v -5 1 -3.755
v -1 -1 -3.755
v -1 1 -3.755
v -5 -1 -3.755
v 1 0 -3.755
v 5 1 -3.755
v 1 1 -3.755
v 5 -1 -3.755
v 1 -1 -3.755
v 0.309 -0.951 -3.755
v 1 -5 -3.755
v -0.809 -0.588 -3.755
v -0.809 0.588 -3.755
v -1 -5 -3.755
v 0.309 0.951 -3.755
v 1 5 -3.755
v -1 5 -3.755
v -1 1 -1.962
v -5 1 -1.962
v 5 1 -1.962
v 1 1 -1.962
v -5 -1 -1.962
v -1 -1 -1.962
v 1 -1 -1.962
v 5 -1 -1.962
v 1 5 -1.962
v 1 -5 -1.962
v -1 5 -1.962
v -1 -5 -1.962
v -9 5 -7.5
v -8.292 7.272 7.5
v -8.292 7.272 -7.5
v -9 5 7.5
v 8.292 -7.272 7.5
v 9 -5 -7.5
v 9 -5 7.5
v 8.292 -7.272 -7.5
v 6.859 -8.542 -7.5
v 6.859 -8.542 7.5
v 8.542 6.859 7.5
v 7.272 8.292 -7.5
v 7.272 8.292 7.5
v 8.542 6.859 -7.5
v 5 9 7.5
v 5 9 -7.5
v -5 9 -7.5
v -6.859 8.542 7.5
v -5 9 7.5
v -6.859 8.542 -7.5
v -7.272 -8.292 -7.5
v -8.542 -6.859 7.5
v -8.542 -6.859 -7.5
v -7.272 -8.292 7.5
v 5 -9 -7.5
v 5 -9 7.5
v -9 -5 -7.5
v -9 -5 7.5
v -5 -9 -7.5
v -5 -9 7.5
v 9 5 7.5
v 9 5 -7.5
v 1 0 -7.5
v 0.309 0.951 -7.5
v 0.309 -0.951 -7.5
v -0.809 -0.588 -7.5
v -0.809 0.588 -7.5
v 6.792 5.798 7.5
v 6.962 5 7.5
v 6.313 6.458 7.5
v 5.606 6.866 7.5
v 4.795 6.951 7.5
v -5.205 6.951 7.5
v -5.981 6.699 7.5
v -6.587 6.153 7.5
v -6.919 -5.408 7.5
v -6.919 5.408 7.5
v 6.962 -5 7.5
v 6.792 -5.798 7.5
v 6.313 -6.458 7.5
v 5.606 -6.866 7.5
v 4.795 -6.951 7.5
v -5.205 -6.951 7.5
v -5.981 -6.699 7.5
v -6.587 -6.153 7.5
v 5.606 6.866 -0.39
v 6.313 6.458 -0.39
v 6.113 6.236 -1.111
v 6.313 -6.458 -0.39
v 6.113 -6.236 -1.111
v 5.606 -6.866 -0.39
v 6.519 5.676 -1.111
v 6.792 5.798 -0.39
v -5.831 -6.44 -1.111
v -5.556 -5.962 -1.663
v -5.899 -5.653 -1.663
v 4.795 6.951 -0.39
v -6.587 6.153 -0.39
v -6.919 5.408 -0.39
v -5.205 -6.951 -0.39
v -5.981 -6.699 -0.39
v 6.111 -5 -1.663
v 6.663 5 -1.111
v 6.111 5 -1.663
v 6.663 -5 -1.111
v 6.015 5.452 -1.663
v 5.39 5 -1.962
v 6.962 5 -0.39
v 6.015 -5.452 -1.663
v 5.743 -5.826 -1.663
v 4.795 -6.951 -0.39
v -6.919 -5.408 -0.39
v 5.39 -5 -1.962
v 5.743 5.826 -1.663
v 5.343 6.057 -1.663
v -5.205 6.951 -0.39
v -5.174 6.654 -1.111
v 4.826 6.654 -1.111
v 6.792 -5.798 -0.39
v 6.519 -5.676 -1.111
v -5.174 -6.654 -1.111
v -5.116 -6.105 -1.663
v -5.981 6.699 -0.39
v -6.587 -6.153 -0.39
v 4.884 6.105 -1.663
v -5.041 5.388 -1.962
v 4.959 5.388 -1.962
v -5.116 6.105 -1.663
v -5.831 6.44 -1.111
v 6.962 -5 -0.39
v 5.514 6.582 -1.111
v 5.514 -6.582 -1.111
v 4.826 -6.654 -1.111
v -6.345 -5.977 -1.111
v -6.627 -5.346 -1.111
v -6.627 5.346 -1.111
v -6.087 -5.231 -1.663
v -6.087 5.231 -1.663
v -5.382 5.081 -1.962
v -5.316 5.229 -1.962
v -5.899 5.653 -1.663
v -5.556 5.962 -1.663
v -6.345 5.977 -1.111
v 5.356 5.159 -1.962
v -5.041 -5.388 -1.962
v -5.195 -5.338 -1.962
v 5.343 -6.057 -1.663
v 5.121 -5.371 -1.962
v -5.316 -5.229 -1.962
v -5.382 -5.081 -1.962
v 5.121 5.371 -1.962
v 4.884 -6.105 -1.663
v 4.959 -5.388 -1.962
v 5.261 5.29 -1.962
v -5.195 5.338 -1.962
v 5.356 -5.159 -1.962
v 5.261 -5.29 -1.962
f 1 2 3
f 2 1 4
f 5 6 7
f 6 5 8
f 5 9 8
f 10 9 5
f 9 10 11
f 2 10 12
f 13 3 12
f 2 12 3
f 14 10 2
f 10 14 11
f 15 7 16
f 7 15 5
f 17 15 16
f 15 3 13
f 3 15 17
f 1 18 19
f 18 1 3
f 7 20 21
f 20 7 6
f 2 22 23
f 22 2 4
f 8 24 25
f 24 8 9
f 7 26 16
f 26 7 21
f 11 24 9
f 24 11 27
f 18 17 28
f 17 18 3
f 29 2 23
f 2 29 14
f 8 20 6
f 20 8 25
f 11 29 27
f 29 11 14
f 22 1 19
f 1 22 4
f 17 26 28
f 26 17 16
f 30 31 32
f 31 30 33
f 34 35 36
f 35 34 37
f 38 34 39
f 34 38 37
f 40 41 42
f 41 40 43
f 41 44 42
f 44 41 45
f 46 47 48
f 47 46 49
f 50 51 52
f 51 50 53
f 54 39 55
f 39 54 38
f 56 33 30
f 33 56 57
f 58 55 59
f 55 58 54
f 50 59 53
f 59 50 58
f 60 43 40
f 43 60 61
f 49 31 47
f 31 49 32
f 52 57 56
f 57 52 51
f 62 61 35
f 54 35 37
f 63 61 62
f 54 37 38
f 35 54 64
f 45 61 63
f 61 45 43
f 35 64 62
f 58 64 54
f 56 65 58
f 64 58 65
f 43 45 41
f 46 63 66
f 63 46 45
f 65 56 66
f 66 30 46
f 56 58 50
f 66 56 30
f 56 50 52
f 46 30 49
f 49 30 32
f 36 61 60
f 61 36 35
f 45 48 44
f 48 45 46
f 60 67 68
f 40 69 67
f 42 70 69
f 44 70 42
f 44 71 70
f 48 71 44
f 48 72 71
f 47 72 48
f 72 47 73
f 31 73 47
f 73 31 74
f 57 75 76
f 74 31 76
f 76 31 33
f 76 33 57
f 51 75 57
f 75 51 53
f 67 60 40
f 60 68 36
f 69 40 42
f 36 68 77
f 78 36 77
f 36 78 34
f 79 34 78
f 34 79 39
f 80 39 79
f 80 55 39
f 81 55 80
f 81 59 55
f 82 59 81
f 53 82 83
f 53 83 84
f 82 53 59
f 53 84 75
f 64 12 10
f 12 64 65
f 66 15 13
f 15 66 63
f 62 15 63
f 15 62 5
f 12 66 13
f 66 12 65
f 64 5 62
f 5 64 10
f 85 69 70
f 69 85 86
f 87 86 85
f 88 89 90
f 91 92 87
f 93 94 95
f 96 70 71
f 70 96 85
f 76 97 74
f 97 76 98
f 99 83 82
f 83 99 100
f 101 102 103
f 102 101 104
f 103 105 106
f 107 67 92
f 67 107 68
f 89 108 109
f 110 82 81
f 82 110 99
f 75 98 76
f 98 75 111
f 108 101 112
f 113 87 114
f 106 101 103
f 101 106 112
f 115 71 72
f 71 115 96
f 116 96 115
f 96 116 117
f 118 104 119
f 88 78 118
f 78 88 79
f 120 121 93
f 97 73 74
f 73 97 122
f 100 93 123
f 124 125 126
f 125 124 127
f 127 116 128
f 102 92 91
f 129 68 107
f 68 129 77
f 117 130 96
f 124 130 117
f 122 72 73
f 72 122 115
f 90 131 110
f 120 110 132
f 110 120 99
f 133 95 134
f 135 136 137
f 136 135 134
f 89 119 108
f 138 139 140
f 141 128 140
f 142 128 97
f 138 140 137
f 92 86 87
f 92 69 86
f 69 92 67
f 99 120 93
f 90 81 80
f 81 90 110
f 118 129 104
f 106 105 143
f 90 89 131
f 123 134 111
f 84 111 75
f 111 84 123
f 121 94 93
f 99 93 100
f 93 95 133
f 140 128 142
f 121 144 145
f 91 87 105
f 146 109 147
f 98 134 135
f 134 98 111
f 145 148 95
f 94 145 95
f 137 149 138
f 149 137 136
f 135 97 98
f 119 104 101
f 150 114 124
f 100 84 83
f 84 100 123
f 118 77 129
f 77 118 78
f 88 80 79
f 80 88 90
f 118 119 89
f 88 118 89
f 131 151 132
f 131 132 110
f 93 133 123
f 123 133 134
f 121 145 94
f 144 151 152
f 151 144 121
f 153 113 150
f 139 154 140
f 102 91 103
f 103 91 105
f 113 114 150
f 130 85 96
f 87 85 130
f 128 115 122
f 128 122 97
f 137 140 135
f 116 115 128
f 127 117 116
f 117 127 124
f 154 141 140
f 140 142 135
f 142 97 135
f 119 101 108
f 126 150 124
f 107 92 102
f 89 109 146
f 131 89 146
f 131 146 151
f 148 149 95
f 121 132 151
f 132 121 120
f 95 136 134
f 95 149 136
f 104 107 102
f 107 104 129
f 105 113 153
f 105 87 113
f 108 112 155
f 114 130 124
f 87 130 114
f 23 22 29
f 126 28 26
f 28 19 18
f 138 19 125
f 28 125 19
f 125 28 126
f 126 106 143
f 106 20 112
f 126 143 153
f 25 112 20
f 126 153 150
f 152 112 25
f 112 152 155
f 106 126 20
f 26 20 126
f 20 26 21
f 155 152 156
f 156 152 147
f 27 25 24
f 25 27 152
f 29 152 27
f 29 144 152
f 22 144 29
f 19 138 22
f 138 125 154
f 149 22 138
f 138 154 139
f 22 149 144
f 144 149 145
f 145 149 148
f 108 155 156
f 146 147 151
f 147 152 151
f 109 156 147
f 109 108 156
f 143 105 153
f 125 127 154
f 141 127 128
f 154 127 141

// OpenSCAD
module conformal_tray(wall_thickness, base_thickness, tray_height, clearance, vacuum_r)
{
    assert($children==1, "Exactly 1 child allowed");
    assert(wall_thickness>0 && base_thickness>0 && tray_height>0 && clearance>0 && vacuum_r>0,"Negative Input");

    // simple way to get infinite length, may not be robust but we can't know for sure the size of children
    _length = (vacuum_r + wall_thickness + clearance) * 1000;

    difference() {
        difference()
        {
            // base
            linear_extrude(height=tray_height, center=true)
            {
                offset(r=wall_thickness + clearance)
                projection(cut=false) { children(); }
            }

            // vaccum bottom cyl
            translate([0,0,-base_thickness])
            cylinder(r=vacuum_r, h=base_thickness+0.02, center=true);
            
            // crosshair 
            translate([0,0,-base_thickness/2])
            intersection()
            {
                linear_extrude(height=tray_height, center=true)
                projection(cut=false) { children(); }
                
                union()
                {
                    cube([_length, vacuum_r*2, base_thickness/2+0.01], center=true);
                    
                    cube([vacuum_r*2, _length, base_thickness/2+0.01], center=true);
                }
            }
        }
        //cutting tool
        translate([0,0,base_thickness])
        {
            hull()
            {
                render(convexity=10) 
                minkowski() 
                {
                    children();
                    sphere(r=clearance, $fn=15);
                }
                
                translate([0,0,tray_height])
                render(convexity=10) 
                minkowski() 
                {
                    children();
                    sphere(r=clearance, $fn=15);
                }
            }
        }
        
    }
}

conformal_tray(2, 5, 15, 2,1)
{
    cube(10, center=true);
}
